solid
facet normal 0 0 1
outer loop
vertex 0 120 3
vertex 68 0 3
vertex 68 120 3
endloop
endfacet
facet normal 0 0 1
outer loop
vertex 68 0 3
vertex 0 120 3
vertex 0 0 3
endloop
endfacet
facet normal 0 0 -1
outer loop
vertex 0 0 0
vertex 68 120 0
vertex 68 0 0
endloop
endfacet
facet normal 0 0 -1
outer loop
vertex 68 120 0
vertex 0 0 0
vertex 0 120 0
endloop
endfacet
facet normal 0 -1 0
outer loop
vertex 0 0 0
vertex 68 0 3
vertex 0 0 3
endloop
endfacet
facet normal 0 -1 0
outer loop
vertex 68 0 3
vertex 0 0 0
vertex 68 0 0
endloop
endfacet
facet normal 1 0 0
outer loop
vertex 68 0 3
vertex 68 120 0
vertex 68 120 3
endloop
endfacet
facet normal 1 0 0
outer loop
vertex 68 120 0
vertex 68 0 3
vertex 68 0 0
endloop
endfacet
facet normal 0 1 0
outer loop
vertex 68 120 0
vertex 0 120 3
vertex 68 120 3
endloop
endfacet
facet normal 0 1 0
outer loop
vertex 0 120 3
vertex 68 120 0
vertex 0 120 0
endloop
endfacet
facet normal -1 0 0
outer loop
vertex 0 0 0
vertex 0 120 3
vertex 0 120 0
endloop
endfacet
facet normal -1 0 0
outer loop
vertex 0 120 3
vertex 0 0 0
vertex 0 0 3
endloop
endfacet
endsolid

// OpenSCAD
bot_length = 120;
bot_width = 68;
default_elem_height = 3;

cube([bot_width, bot_length, default_elem_height]);
